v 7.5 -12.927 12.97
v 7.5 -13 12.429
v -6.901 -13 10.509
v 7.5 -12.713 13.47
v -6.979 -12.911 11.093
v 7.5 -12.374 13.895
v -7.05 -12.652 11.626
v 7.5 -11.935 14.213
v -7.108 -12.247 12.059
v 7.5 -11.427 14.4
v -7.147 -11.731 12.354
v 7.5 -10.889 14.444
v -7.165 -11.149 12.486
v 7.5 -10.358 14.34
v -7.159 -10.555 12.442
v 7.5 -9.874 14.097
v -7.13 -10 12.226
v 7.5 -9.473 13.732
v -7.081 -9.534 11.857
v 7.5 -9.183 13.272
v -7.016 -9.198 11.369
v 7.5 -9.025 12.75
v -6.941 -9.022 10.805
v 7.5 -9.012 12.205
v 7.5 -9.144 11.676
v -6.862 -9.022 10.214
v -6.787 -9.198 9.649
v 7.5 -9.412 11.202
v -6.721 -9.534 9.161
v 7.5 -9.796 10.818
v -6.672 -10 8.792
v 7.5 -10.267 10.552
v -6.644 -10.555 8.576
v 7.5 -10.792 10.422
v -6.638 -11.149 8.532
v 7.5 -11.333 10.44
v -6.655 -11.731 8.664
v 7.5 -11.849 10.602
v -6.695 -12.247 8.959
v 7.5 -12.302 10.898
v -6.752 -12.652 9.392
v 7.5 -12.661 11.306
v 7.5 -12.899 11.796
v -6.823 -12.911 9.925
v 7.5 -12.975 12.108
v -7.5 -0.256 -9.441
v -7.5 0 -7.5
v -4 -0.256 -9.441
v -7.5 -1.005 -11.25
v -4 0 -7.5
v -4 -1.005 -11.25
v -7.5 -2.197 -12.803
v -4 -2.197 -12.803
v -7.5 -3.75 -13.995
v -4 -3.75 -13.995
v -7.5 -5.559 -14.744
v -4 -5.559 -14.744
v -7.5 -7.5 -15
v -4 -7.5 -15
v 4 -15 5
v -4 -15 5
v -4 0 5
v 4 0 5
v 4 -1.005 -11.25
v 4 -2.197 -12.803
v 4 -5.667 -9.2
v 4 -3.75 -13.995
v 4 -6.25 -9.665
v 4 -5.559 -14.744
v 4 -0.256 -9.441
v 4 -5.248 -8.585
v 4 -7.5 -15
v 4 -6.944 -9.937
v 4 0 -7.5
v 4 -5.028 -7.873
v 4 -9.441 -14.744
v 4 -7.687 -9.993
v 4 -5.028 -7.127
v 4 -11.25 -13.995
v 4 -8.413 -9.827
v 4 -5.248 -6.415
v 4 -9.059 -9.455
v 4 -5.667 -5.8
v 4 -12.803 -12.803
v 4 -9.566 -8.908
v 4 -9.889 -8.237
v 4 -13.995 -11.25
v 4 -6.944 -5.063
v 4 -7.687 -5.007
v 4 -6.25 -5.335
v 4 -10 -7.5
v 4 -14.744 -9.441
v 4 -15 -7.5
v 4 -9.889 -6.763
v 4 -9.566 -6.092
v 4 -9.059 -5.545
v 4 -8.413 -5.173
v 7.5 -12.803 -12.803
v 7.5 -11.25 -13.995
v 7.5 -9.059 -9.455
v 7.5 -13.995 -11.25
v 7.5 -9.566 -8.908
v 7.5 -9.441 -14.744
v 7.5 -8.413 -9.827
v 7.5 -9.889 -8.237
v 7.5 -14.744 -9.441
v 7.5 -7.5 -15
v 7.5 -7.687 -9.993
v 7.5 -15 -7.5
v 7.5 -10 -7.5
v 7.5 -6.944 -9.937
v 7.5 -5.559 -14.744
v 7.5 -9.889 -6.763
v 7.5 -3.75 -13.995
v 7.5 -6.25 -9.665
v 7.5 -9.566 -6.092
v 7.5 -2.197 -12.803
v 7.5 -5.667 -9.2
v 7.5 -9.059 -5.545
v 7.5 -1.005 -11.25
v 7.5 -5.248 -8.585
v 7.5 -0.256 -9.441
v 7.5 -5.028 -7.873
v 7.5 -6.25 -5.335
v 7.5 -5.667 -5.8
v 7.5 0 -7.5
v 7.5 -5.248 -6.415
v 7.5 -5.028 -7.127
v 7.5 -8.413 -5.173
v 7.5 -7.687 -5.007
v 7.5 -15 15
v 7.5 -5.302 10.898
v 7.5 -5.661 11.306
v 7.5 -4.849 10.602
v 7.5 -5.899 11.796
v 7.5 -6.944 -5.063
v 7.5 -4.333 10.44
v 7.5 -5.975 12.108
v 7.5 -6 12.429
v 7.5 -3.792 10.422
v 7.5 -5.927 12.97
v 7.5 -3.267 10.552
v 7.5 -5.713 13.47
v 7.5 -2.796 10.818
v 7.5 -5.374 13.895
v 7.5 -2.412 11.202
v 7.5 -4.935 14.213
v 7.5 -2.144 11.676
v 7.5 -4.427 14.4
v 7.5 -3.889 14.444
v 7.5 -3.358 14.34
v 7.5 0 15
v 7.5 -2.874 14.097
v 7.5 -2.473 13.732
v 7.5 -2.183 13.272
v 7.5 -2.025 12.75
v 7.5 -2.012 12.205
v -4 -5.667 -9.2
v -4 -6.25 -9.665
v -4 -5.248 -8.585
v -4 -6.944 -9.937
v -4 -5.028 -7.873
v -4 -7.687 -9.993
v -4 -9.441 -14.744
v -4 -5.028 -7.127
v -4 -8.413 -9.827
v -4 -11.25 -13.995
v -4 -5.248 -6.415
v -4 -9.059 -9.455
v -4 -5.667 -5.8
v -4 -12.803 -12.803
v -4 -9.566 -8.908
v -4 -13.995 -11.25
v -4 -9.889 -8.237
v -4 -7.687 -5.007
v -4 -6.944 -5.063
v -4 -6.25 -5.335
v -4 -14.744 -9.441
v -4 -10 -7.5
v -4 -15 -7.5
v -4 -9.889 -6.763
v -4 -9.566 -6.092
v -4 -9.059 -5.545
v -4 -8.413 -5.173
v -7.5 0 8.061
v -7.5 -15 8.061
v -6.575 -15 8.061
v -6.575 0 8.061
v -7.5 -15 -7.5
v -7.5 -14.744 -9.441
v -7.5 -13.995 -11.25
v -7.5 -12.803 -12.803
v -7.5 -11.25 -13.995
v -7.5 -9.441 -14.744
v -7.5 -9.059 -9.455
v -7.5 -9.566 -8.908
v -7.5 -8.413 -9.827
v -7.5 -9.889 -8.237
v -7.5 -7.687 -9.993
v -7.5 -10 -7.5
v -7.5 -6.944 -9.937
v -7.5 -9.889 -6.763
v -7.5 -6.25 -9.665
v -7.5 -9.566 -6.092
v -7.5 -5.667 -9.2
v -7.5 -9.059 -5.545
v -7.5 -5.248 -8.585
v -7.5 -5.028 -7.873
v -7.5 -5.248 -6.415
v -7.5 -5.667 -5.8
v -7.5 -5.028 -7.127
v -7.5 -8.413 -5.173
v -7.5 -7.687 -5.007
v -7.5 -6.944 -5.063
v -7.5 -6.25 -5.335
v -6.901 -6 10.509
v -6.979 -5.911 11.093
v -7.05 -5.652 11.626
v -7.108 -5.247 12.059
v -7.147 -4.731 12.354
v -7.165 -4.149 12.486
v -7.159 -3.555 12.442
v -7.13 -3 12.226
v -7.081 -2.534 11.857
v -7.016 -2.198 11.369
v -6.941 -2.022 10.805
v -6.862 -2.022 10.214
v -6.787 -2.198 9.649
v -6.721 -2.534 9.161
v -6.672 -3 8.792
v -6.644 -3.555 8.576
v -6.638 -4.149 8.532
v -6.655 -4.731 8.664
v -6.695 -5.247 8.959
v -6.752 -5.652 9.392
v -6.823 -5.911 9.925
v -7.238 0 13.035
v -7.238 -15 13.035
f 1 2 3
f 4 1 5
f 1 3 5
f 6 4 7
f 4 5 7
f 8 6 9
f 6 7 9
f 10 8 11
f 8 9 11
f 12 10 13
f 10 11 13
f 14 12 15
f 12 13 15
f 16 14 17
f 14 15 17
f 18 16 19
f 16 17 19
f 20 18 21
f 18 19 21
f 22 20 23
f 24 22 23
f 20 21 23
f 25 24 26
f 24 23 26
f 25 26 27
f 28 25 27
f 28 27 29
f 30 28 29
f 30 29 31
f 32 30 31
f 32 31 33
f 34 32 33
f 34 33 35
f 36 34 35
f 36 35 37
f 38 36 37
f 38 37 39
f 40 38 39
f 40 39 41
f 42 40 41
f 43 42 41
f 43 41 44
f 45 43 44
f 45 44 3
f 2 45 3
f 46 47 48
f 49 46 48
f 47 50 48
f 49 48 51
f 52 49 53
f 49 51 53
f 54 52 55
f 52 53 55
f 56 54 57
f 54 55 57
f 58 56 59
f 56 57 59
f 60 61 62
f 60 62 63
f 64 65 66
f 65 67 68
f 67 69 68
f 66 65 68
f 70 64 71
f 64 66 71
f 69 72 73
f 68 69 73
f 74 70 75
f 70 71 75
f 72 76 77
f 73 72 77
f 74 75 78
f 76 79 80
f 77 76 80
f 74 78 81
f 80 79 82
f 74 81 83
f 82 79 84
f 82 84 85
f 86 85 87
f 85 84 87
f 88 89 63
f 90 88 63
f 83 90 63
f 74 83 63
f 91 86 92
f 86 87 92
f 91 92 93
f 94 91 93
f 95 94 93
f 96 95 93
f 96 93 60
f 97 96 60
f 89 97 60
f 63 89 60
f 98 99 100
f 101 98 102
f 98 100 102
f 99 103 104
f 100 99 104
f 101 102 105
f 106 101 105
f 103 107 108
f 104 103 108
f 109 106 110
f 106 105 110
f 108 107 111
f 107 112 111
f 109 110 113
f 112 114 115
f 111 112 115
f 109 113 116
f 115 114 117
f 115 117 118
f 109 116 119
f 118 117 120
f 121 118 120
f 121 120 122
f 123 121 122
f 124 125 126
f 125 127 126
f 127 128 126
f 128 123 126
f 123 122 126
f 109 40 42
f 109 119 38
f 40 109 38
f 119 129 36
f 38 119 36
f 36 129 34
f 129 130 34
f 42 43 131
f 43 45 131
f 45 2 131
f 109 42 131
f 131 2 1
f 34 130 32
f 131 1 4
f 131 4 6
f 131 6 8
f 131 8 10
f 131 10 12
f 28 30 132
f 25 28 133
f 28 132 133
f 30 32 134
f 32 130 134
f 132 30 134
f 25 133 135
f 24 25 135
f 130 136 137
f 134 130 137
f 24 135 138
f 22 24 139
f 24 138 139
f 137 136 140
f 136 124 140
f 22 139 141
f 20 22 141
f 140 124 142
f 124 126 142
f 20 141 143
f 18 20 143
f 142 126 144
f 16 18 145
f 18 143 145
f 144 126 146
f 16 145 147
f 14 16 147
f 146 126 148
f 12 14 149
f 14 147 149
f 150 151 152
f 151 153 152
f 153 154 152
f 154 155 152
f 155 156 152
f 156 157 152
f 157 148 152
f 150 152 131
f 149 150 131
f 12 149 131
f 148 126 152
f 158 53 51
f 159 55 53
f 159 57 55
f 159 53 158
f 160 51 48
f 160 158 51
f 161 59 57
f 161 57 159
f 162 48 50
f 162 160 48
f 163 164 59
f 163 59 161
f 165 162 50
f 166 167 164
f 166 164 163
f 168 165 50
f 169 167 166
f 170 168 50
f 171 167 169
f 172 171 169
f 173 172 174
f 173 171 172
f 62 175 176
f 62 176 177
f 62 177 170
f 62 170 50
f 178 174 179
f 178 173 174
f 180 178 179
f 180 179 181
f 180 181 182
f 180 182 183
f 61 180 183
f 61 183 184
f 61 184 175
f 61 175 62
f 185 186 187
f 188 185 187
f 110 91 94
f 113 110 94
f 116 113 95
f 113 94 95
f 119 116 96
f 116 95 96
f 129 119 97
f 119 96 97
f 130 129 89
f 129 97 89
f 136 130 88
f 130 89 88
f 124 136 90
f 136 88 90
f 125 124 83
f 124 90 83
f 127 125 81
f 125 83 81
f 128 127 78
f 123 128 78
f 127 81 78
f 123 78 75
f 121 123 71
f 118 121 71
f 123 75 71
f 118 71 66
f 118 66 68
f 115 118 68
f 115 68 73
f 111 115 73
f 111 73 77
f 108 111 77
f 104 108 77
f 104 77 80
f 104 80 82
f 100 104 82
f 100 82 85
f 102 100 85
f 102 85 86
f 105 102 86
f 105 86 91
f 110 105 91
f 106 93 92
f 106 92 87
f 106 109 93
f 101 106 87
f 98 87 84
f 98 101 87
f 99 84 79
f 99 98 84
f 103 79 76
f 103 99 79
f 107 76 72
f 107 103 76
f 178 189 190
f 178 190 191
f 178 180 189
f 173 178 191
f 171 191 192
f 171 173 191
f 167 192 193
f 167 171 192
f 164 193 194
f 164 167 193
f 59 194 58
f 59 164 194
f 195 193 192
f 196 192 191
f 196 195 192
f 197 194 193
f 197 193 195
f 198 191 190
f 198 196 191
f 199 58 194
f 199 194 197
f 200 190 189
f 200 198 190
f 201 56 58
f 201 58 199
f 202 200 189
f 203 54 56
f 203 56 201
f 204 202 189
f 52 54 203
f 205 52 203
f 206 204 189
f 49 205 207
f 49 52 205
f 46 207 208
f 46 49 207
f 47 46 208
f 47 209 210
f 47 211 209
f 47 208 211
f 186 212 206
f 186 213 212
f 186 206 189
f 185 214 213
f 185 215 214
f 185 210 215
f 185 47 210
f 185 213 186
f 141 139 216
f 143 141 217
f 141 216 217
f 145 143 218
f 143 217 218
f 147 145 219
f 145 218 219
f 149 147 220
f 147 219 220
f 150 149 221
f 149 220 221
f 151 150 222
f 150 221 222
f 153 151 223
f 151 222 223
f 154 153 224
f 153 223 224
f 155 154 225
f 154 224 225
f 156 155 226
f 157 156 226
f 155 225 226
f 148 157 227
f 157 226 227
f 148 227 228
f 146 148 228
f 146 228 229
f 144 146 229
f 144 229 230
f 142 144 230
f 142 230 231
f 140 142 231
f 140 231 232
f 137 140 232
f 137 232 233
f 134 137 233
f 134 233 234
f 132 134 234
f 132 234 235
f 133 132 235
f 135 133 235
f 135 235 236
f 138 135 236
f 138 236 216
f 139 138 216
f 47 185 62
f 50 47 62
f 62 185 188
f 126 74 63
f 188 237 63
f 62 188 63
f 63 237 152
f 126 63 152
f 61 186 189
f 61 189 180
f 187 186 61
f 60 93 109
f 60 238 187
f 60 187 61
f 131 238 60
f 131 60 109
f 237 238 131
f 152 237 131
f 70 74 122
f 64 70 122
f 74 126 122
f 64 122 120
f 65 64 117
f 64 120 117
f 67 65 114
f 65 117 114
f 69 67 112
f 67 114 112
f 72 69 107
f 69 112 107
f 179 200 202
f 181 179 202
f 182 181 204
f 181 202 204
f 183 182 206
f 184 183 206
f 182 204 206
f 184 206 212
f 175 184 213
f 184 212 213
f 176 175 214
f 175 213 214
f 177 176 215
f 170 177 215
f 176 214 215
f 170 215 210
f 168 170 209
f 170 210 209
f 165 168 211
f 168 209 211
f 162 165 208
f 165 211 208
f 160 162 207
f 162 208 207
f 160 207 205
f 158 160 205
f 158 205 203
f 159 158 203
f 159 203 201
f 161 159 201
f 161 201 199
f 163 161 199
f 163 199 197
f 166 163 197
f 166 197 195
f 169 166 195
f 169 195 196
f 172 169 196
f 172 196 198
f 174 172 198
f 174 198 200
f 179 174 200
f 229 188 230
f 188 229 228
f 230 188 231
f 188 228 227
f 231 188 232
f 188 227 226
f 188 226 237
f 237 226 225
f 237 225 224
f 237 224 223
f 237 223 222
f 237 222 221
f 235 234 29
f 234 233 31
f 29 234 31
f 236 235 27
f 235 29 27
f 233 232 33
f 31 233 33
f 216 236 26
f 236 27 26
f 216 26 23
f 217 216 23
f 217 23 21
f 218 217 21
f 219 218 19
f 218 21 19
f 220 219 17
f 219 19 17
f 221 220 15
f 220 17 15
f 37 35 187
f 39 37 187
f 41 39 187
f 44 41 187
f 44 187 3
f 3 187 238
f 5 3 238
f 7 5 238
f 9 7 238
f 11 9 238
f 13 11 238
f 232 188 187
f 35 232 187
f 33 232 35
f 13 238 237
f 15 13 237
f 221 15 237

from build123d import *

# Parameters (mm, degrees)
F0_W     = 15
F0_H     = 30
F1_DEPTH = 15
F2_W     = 8
F2_H     = 20
F3_DEPTH = 25.4
F4_R     = 7.49999
F5_R     = 2
F6_DEPTH = 25.4
F7_R     = 2.5
F8_DEPTH = 25.4


# Not quite as in the source:
# - a fillet or chamfer is up to 0.001 mm smaller than in the source, because OpenCascade refuses the exact size


with BuildPart() as f1:
    # F0 (on Front) → F1 (new body)
    with BuildSketch(Plane.XZ):
        Rectangle(F0_W, F0_H)
    extrude(amount=F1_DEPTH)

    # F2 (on face) → F3 (cut)
    with BuildSketch(Plane.XZ.offset(15)):
        with Locations((0, -5)):
            Rectangle(F2_W, F2_H)
        Polygon((-7.5, 15), (-7.5, 13), (-7.2379912664, 13.0349344978), align=None)
        Polygon((-7.2379912664, 13.0349344978), (-7.5, 13), (-7.5, 8.0614046952), (-6.5748539594, 8.0614046952), align=None)
        Polygon((-7.5, 15), (-7.2379912664, 13.0349344978), (7.5, 15), align=None)
    extrude(amount=-F3_DEPTH, mode=Mode.SUBTRACT)

    # F4 (radius 7.5 in the source; OpenCascade refuses exactly that, so slightly less here)
    f4_edges = [f1.edges().sort_by_distance(p)[0] for p in [
        (-5.75, -15, -15),
        (-5.75, 0, -15),
        (5.75, 0, -15),
        (5.75, -15, -15),
    ]]
    fillet(f4_edges, radius=F4_R)

    # F5 (on face) → F6 (cut)
    with BuildSketch(Plane(origin=(-5.403930131, 0, -0.7205240175), x_dir=(0, -1, 0), z_dir=(-0.9912279007, 0, -0.1321637201))):
        with Locations((4, 11.3289700367)):
            Circle(F5_R)
        with Locations((11, 11.3289700367)):
            Circle(F5_R)
    extrude(amount=-F6_DEPTH, mode=Mode.SUBTRACT)

    # F7 (on face) → F8 (cut)
    with BuildSketch(Plane(origin=(-7.5, 0, 0), x_dir=(0, -1, 0), z_dir=(-1, 0, 0))):
        with Locations((7.5, -7.5)):
            Circle(F7_R)
    extrude(amount=-F8_DEPTH, mode=Mode.SUBTRACT)


solid = f1.part
